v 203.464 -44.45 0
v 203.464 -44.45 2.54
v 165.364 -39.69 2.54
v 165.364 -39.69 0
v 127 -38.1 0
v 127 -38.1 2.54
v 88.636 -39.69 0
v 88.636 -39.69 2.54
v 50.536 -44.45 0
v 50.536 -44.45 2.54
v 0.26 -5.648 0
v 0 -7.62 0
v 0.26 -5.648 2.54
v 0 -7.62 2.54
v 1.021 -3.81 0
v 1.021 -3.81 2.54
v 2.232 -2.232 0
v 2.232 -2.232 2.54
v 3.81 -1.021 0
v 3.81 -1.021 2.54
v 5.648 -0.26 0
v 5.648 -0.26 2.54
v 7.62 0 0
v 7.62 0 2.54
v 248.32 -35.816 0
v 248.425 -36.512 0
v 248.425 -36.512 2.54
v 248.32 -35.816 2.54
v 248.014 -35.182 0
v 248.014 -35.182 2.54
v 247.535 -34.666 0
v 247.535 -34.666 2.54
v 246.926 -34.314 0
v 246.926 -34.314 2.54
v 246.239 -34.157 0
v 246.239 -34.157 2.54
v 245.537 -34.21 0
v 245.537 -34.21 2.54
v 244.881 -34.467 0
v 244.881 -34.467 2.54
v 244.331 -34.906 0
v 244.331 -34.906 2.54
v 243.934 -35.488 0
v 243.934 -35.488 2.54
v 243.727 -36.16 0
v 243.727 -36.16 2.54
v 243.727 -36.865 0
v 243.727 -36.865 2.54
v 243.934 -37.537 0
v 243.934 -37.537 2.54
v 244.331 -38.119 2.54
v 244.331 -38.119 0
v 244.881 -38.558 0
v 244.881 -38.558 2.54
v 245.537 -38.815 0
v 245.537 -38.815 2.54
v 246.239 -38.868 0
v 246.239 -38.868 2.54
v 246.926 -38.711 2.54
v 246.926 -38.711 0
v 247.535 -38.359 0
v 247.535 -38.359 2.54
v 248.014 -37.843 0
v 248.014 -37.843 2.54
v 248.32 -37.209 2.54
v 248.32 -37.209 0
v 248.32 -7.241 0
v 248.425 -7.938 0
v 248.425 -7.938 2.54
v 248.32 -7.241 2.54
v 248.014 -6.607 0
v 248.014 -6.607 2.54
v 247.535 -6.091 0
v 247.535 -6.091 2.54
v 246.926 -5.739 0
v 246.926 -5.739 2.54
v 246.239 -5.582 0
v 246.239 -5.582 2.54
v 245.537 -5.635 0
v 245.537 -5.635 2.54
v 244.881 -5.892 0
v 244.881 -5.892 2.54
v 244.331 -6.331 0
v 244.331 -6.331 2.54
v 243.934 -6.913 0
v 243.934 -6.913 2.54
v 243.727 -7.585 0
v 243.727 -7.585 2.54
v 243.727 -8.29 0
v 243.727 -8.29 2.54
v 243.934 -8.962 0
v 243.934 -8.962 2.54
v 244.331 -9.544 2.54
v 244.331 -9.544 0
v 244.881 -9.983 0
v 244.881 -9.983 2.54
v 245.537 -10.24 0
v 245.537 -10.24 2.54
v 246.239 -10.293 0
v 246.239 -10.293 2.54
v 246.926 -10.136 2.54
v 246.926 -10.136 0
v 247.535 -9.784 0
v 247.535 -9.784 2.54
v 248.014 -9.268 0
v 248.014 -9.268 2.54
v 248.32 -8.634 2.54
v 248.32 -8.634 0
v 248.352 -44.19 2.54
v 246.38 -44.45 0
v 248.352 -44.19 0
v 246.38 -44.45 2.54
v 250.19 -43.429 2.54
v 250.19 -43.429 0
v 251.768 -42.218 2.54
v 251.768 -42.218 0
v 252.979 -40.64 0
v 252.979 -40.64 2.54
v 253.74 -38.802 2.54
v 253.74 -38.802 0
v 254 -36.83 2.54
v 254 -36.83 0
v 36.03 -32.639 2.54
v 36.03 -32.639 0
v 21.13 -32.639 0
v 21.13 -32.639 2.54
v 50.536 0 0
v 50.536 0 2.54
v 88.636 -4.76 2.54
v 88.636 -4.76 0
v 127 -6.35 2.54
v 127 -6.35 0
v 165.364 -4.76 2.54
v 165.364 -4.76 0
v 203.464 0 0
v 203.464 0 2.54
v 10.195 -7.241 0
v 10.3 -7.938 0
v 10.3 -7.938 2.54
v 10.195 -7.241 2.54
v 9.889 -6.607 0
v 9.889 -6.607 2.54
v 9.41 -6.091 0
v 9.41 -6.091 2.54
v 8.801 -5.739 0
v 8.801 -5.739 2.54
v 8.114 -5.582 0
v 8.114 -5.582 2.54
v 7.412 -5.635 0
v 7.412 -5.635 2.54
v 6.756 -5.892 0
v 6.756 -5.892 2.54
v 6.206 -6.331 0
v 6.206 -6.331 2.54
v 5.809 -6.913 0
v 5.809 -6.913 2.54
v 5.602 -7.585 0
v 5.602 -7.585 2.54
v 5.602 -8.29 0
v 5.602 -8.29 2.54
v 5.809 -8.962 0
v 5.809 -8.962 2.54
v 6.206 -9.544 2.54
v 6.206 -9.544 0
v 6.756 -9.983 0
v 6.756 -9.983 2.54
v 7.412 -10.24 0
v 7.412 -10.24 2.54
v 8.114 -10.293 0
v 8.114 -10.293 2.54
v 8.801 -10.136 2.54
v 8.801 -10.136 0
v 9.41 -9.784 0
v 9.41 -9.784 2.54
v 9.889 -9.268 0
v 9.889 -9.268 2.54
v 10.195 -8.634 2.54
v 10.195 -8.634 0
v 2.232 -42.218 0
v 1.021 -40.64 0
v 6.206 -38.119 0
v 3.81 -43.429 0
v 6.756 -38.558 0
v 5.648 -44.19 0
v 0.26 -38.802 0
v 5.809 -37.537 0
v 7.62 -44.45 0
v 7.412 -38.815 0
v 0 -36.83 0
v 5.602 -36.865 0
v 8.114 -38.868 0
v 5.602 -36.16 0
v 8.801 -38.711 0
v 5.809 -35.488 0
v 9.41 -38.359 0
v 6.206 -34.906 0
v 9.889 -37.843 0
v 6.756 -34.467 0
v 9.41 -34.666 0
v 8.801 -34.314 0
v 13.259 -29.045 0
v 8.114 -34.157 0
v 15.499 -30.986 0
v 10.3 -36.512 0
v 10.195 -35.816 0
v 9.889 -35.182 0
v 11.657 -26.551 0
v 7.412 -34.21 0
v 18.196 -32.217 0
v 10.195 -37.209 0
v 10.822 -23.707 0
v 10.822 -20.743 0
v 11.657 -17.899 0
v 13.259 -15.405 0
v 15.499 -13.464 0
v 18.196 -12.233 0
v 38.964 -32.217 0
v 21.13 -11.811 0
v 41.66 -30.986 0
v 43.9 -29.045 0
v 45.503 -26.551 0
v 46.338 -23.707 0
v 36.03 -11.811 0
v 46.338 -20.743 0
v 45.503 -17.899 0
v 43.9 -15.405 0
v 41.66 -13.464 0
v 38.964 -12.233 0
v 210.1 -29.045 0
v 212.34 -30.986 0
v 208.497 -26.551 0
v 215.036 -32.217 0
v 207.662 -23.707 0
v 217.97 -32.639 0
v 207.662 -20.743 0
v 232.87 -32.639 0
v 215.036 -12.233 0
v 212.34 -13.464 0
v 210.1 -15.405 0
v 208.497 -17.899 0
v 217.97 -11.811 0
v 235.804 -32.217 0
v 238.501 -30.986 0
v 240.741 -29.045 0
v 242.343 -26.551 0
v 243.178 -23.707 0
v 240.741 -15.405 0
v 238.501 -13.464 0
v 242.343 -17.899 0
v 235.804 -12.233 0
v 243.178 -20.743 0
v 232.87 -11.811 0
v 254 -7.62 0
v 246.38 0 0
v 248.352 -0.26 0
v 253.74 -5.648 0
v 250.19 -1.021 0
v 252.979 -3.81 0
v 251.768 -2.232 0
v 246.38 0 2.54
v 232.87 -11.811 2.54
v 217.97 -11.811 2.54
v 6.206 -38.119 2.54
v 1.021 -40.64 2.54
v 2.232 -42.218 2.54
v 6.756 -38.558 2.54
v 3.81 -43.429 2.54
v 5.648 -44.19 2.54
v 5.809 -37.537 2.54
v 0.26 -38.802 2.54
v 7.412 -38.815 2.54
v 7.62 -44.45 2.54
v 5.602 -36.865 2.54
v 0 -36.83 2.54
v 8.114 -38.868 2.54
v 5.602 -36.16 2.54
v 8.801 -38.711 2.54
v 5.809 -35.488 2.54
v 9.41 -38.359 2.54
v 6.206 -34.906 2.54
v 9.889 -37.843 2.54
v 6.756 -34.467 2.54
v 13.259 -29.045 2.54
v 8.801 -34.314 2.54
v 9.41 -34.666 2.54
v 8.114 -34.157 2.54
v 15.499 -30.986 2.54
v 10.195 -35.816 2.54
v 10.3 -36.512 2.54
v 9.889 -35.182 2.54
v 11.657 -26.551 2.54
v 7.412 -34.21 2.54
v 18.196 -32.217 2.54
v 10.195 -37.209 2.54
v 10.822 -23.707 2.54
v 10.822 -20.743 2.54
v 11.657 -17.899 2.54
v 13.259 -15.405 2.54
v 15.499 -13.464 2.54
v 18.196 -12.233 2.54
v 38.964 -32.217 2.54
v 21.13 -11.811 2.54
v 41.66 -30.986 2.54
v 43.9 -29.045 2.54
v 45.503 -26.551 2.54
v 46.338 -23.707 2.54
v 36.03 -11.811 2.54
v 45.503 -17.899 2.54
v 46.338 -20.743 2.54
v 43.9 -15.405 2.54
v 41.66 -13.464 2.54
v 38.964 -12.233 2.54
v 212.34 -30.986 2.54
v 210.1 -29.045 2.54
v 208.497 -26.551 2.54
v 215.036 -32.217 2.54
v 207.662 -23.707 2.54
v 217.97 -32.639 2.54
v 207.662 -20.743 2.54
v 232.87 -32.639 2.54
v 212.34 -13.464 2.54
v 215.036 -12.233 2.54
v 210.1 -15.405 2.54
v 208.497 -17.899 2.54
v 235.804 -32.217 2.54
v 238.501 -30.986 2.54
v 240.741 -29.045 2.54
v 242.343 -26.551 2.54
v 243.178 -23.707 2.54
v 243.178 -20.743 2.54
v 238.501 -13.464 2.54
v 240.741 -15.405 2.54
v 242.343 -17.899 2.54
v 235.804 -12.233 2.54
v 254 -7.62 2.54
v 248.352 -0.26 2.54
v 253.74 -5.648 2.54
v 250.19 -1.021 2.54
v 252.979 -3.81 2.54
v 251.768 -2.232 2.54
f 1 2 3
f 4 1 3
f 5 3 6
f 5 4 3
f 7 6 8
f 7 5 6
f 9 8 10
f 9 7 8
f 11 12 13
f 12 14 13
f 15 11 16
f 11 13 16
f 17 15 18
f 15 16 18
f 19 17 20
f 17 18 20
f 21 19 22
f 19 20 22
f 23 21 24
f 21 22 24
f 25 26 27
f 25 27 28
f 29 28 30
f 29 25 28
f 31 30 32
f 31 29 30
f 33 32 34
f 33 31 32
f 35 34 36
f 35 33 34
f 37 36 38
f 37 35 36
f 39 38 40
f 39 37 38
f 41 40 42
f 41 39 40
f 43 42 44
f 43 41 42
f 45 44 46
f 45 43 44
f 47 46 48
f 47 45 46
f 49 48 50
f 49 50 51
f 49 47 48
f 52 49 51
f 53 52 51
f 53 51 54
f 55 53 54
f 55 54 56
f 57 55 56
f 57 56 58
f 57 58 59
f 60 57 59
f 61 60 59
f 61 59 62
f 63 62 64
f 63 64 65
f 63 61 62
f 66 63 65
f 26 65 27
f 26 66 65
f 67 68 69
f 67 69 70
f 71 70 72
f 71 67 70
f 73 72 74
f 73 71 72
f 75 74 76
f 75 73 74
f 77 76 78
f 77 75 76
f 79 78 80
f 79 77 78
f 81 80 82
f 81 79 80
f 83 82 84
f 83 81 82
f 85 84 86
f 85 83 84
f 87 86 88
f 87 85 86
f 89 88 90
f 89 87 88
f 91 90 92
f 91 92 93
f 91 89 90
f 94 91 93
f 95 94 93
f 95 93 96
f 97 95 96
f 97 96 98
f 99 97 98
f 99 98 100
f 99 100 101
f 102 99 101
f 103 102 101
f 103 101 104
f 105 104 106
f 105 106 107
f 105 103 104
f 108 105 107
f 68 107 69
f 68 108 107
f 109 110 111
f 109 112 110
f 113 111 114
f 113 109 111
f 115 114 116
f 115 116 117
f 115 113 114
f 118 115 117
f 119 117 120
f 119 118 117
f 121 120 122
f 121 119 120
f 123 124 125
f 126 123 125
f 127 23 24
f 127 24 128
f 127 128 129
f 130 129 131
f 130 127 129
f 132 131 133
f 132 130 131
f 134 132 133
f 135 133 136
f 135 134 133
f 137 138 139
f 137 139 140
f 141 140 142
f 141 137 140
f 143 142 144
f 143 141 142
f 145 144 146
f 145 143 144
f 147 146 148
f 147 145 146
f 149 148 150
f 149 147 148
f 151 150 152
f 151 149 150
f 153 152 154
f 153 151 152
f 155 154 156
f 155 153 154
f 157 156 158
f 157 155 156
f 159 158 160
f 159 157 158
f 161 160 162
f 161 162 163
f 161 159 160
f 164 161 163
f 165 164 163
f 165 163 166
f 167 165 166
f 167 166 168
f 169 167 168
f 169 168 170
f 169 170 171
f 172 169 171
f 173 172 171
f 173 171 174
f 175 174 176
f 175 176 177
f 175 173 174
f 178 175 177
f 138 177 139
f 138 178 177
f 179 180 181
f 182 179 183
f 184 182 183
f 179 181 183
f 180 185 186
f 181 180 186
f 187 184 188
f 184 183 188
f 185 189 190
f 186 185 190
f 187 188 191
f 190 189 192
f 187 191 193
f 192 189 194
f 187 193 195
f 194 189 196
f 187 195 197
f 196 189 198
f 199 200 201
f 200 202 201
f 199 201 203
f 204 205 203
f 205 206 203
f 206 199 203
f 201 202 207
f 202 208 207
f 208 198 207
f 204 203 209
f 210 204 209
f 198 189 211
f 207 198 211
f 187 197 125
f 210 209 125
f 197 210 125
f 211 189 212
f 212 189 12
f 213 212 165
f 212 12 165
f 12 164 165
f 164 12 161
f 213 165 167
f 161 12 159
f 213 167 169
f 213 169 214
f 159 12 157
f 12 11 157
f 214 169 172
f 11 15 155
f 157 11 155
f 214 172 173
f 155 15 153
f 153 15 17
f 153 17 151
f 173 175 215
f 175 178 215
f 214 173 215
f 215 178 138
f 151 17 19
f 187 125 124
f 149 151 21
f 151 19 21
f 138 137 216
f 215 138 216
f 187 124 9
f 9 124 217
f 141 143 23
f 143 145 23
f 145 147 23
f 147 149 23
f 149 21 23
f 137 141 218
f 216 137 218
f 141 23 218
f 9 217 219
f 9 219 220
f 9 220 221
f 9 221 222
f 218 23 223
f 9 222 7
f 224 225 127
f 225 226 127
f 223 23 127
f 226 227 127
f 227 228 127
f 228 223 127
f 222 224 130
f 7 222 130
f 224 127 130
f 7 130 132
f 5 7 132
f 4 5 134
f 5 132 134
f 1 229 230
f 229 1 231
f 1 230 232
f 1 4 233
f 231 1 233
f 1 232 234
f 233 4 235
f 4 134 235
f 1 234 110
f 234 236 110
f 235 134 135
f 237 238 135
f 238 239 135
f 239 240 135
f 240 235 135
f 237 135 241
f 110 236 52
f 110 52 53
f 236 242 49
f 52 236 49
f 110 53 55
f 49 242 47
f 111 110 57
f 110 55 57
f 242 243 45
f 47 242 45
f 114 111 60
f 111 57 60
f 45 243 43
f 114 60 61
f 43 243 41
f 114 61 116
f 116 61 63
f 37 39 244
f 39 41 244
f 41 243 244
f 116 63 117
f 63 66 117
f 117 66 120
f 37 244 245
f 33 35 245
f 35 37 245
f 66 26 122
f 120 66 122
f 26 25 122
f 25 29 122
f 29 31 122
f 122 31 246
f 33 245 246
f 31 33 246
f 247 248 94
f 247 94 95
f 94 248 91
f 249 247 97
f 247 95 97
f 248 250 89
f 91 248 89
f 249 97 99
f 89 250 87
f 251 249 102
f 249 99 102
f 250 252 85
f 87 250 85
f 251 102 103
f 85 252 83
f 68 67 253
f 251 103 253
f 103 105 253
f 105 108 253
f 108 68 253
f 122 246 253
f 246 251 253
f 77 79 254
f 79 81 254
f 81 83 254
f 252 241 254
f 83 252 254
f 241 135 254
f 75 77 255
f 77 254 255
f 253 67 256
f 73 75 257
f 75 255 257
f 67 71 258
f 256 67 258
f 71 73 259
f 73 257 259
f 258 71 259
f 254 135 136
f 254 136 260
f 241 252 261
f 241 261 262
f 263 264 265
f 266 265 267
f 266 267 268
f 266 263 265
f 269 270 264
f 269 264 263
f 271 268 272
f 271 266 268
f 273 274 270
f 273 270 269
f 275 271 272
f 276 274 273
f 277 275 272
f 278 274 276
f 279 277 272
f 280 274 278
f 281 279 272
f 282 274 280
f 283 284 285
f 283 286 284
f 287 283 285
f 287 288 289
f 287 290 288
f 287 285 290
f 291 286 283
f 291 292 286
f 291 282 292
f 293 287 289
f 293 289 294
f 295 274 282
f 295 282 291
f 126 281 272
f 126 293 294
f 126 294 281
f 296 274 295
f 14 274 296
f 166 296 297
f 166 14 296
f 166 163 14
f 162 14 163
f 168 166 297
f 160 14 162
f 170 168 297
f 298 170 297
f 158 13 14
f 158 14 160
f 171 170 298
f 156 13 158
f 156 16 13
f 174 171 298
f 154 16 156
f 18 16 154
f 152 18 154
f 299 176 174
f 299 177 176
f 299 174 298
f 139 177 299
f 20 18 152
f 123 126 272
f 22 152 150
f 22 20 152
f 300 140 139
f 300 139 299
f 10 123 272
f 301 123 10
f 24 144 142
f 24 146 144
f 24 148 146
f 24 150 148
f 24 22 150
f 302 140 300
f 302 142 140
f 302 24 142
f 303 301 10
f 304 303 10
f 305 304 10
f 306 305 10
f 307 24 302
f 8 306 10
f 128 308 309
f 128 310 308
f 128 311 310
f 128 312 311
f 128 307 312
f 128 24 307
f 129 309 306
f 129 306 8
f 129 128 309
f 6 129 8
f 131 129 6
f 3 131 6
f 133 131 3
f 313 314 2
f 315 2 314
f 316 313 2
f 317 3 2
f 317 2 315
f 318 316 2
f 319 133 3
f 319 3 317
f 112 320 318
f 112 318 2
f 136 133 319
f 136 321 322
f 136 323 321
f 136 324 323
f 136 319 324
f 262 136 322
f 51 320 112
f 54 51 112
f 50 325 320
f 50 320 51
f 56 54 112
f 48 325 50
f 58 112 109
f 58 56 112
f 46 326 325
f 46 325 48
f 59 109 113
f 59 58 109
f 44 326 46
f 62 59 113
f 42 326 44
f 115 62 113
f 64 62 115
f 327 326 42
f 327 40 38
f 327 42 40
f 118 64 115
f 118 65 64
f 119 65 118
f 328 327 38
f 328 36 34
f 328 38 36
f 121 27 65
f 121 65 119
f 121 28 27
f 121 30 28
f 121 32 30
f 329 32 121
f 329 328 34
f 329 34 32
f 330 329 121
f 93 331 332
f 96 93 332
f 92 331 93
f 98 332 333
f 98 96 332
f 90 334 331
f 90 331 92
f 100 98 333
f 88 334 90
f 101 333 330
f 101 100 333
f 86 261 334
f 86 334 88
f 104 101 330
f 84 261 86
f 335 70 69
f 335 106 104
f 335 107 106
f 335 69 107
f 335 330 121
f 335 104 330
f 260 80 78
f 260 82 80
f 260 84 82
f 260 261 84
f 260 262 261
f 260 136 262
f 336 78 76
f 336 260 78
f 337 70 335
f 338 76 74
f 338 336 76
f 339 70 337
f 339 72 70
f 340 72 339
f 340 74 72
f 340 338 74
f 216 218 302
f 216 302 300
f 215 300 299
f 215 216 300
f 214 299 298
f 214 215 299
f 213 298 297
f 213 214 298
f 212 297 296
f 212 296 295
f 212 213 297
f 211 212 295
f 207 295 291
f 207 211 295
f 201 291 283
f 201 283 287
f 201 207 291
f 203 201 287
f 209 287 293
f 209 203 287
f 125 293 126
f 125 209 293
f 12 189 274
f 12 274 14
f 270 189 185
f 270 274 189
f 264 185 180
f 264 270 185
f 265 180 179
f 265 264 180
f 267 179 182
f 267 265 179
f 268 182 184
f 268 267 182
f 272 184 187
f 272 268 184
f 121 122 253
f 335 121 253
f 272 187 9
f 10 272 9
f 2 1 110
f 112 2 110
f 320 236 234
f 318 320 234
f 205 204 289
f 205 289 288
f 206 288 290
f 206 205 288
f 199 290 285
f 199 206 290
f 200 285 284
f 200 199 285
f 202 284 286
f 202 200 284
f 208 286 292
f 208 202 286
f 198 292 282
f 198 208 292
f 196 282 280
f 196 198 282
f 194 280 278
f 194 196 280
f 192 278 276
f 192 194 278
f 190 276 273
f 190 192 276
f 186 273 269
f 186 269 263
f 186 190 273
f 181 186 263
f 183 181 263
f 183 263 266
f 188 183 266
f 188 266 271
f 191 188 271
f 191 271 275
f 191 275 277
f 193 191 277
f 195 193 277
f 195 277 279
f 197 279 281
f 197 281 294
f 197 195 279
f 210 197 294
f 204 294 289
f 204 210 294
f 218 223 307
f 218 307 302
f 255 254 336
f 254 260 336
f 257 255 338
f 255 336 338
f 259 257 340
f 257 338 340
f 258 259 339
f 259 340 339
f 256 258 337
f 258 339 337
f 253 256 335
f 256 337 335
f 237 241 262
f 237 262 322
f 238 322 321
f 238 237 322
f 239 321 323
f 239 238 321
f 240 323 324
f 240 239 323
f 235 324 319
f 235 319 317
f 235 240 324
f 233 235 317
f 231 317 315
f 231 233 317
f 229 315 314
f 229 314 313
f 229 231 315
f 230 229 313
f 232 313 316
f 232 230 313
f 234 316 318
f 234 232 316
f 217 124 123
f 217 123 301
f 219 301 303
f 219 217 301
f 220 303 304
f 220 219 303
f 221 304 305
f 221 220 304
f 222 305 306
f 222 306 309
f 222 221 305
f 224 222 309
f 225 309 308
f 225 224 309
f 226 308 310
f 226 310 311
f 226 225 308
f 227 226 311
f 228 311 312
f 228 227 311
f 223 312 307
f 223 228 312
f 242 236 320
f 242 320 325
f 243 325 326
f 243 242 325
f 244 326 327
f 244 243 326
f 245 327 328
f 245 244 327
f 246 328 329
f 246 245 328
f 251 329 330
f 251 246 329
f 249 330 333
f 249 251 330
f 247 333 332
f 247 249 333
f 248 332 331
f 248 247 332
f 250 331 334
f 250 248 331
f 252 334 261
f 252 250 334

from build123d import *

# Parameters (mm, degrees)
SKETCH_W     = 254
SKETCH_H     = 44.45
SKETCH_R     = 2.3622
PAD_DEPTH    = 2.54
FILLET_R     = 7.62
SKETCH001_R  = 463.55
POCKET_DEPTH = 5.00126


with BuildPart() as part:
    # Sketch → Pad (new body)
    with BuildSketch(Plane.XY):
        with Locations((127, -22.225)):
            Rectangle(SKETCH_W, SKETCH_H)
        with Locations((7.9375, -7.9375)):
            Circle(SKETCH_R, mode=Mode.SUBTRACT)
        with Locations((7.9375, -36.5125)):
            Circle(SKETCH_R, mode=Mode.SUBTRACT)
        with Locations((246.0625, -7.9375)):
            Circle(SKETCH_R, mode=Mode.SUBTRACT)
        with Locations((246.0625, -36.5125)):
            Circle(SKETCH_R, mode=Mode.SUBTRACT)
        with BuildLine():
            ThreePointArc((36.0299, -32.639), (46.4439, -22.225), (36.0299, -11.811))
            Line((36.0299, -11.811), (21.129625, -11.811))
            ThreePointArc((21.129625, -11.811), (10.715625, -22.225), (21.129625, -32.639))
            Line((36.0299, -32.639), (21.129625, -32.639))
        make_face(mode=Mode.SUBTRACT)
        with BuildLine():
            ThreePointArc((232.870375, -32.639), (243.284375, -22.225), (232.870375, -11.811))
            Line((232.870375, -11.811), (217.9701, -11.811))
            ThreePointArc((217.9701, -11.811), (207.5561, -22.225), (217.9701, -32.639))
            Line((232.870375, -32.639), (217.9701, -32.639))
        make_face(mode=Mode.SUBTRACT)
    extrude(amount=PAD_DEPTH)

    # Fillet
    fillet_edges = [part.edges().sort_by_distance(p)[0] for p in [
        (0, -44.45, 1.27),
        (0, 0, 1.27),
        (254, -44.45, 1.27),
        (254, 0, 1.27),
    ]]
    fillet(fillet_edges, radius=FILLET_R)

    # Sketch001 → Pocket (cut)
    with BuildSketch(Plane.XY):
        with Locations((127, -501.65)):
            Circle(SKETCH001_R)
        with Locations((127, 457.2)):
            Circle(SKETCH001_R)
    extrude(amount=POCKET_DEPTH, mode=Mode.SUBTRACT)


solid = part.part
